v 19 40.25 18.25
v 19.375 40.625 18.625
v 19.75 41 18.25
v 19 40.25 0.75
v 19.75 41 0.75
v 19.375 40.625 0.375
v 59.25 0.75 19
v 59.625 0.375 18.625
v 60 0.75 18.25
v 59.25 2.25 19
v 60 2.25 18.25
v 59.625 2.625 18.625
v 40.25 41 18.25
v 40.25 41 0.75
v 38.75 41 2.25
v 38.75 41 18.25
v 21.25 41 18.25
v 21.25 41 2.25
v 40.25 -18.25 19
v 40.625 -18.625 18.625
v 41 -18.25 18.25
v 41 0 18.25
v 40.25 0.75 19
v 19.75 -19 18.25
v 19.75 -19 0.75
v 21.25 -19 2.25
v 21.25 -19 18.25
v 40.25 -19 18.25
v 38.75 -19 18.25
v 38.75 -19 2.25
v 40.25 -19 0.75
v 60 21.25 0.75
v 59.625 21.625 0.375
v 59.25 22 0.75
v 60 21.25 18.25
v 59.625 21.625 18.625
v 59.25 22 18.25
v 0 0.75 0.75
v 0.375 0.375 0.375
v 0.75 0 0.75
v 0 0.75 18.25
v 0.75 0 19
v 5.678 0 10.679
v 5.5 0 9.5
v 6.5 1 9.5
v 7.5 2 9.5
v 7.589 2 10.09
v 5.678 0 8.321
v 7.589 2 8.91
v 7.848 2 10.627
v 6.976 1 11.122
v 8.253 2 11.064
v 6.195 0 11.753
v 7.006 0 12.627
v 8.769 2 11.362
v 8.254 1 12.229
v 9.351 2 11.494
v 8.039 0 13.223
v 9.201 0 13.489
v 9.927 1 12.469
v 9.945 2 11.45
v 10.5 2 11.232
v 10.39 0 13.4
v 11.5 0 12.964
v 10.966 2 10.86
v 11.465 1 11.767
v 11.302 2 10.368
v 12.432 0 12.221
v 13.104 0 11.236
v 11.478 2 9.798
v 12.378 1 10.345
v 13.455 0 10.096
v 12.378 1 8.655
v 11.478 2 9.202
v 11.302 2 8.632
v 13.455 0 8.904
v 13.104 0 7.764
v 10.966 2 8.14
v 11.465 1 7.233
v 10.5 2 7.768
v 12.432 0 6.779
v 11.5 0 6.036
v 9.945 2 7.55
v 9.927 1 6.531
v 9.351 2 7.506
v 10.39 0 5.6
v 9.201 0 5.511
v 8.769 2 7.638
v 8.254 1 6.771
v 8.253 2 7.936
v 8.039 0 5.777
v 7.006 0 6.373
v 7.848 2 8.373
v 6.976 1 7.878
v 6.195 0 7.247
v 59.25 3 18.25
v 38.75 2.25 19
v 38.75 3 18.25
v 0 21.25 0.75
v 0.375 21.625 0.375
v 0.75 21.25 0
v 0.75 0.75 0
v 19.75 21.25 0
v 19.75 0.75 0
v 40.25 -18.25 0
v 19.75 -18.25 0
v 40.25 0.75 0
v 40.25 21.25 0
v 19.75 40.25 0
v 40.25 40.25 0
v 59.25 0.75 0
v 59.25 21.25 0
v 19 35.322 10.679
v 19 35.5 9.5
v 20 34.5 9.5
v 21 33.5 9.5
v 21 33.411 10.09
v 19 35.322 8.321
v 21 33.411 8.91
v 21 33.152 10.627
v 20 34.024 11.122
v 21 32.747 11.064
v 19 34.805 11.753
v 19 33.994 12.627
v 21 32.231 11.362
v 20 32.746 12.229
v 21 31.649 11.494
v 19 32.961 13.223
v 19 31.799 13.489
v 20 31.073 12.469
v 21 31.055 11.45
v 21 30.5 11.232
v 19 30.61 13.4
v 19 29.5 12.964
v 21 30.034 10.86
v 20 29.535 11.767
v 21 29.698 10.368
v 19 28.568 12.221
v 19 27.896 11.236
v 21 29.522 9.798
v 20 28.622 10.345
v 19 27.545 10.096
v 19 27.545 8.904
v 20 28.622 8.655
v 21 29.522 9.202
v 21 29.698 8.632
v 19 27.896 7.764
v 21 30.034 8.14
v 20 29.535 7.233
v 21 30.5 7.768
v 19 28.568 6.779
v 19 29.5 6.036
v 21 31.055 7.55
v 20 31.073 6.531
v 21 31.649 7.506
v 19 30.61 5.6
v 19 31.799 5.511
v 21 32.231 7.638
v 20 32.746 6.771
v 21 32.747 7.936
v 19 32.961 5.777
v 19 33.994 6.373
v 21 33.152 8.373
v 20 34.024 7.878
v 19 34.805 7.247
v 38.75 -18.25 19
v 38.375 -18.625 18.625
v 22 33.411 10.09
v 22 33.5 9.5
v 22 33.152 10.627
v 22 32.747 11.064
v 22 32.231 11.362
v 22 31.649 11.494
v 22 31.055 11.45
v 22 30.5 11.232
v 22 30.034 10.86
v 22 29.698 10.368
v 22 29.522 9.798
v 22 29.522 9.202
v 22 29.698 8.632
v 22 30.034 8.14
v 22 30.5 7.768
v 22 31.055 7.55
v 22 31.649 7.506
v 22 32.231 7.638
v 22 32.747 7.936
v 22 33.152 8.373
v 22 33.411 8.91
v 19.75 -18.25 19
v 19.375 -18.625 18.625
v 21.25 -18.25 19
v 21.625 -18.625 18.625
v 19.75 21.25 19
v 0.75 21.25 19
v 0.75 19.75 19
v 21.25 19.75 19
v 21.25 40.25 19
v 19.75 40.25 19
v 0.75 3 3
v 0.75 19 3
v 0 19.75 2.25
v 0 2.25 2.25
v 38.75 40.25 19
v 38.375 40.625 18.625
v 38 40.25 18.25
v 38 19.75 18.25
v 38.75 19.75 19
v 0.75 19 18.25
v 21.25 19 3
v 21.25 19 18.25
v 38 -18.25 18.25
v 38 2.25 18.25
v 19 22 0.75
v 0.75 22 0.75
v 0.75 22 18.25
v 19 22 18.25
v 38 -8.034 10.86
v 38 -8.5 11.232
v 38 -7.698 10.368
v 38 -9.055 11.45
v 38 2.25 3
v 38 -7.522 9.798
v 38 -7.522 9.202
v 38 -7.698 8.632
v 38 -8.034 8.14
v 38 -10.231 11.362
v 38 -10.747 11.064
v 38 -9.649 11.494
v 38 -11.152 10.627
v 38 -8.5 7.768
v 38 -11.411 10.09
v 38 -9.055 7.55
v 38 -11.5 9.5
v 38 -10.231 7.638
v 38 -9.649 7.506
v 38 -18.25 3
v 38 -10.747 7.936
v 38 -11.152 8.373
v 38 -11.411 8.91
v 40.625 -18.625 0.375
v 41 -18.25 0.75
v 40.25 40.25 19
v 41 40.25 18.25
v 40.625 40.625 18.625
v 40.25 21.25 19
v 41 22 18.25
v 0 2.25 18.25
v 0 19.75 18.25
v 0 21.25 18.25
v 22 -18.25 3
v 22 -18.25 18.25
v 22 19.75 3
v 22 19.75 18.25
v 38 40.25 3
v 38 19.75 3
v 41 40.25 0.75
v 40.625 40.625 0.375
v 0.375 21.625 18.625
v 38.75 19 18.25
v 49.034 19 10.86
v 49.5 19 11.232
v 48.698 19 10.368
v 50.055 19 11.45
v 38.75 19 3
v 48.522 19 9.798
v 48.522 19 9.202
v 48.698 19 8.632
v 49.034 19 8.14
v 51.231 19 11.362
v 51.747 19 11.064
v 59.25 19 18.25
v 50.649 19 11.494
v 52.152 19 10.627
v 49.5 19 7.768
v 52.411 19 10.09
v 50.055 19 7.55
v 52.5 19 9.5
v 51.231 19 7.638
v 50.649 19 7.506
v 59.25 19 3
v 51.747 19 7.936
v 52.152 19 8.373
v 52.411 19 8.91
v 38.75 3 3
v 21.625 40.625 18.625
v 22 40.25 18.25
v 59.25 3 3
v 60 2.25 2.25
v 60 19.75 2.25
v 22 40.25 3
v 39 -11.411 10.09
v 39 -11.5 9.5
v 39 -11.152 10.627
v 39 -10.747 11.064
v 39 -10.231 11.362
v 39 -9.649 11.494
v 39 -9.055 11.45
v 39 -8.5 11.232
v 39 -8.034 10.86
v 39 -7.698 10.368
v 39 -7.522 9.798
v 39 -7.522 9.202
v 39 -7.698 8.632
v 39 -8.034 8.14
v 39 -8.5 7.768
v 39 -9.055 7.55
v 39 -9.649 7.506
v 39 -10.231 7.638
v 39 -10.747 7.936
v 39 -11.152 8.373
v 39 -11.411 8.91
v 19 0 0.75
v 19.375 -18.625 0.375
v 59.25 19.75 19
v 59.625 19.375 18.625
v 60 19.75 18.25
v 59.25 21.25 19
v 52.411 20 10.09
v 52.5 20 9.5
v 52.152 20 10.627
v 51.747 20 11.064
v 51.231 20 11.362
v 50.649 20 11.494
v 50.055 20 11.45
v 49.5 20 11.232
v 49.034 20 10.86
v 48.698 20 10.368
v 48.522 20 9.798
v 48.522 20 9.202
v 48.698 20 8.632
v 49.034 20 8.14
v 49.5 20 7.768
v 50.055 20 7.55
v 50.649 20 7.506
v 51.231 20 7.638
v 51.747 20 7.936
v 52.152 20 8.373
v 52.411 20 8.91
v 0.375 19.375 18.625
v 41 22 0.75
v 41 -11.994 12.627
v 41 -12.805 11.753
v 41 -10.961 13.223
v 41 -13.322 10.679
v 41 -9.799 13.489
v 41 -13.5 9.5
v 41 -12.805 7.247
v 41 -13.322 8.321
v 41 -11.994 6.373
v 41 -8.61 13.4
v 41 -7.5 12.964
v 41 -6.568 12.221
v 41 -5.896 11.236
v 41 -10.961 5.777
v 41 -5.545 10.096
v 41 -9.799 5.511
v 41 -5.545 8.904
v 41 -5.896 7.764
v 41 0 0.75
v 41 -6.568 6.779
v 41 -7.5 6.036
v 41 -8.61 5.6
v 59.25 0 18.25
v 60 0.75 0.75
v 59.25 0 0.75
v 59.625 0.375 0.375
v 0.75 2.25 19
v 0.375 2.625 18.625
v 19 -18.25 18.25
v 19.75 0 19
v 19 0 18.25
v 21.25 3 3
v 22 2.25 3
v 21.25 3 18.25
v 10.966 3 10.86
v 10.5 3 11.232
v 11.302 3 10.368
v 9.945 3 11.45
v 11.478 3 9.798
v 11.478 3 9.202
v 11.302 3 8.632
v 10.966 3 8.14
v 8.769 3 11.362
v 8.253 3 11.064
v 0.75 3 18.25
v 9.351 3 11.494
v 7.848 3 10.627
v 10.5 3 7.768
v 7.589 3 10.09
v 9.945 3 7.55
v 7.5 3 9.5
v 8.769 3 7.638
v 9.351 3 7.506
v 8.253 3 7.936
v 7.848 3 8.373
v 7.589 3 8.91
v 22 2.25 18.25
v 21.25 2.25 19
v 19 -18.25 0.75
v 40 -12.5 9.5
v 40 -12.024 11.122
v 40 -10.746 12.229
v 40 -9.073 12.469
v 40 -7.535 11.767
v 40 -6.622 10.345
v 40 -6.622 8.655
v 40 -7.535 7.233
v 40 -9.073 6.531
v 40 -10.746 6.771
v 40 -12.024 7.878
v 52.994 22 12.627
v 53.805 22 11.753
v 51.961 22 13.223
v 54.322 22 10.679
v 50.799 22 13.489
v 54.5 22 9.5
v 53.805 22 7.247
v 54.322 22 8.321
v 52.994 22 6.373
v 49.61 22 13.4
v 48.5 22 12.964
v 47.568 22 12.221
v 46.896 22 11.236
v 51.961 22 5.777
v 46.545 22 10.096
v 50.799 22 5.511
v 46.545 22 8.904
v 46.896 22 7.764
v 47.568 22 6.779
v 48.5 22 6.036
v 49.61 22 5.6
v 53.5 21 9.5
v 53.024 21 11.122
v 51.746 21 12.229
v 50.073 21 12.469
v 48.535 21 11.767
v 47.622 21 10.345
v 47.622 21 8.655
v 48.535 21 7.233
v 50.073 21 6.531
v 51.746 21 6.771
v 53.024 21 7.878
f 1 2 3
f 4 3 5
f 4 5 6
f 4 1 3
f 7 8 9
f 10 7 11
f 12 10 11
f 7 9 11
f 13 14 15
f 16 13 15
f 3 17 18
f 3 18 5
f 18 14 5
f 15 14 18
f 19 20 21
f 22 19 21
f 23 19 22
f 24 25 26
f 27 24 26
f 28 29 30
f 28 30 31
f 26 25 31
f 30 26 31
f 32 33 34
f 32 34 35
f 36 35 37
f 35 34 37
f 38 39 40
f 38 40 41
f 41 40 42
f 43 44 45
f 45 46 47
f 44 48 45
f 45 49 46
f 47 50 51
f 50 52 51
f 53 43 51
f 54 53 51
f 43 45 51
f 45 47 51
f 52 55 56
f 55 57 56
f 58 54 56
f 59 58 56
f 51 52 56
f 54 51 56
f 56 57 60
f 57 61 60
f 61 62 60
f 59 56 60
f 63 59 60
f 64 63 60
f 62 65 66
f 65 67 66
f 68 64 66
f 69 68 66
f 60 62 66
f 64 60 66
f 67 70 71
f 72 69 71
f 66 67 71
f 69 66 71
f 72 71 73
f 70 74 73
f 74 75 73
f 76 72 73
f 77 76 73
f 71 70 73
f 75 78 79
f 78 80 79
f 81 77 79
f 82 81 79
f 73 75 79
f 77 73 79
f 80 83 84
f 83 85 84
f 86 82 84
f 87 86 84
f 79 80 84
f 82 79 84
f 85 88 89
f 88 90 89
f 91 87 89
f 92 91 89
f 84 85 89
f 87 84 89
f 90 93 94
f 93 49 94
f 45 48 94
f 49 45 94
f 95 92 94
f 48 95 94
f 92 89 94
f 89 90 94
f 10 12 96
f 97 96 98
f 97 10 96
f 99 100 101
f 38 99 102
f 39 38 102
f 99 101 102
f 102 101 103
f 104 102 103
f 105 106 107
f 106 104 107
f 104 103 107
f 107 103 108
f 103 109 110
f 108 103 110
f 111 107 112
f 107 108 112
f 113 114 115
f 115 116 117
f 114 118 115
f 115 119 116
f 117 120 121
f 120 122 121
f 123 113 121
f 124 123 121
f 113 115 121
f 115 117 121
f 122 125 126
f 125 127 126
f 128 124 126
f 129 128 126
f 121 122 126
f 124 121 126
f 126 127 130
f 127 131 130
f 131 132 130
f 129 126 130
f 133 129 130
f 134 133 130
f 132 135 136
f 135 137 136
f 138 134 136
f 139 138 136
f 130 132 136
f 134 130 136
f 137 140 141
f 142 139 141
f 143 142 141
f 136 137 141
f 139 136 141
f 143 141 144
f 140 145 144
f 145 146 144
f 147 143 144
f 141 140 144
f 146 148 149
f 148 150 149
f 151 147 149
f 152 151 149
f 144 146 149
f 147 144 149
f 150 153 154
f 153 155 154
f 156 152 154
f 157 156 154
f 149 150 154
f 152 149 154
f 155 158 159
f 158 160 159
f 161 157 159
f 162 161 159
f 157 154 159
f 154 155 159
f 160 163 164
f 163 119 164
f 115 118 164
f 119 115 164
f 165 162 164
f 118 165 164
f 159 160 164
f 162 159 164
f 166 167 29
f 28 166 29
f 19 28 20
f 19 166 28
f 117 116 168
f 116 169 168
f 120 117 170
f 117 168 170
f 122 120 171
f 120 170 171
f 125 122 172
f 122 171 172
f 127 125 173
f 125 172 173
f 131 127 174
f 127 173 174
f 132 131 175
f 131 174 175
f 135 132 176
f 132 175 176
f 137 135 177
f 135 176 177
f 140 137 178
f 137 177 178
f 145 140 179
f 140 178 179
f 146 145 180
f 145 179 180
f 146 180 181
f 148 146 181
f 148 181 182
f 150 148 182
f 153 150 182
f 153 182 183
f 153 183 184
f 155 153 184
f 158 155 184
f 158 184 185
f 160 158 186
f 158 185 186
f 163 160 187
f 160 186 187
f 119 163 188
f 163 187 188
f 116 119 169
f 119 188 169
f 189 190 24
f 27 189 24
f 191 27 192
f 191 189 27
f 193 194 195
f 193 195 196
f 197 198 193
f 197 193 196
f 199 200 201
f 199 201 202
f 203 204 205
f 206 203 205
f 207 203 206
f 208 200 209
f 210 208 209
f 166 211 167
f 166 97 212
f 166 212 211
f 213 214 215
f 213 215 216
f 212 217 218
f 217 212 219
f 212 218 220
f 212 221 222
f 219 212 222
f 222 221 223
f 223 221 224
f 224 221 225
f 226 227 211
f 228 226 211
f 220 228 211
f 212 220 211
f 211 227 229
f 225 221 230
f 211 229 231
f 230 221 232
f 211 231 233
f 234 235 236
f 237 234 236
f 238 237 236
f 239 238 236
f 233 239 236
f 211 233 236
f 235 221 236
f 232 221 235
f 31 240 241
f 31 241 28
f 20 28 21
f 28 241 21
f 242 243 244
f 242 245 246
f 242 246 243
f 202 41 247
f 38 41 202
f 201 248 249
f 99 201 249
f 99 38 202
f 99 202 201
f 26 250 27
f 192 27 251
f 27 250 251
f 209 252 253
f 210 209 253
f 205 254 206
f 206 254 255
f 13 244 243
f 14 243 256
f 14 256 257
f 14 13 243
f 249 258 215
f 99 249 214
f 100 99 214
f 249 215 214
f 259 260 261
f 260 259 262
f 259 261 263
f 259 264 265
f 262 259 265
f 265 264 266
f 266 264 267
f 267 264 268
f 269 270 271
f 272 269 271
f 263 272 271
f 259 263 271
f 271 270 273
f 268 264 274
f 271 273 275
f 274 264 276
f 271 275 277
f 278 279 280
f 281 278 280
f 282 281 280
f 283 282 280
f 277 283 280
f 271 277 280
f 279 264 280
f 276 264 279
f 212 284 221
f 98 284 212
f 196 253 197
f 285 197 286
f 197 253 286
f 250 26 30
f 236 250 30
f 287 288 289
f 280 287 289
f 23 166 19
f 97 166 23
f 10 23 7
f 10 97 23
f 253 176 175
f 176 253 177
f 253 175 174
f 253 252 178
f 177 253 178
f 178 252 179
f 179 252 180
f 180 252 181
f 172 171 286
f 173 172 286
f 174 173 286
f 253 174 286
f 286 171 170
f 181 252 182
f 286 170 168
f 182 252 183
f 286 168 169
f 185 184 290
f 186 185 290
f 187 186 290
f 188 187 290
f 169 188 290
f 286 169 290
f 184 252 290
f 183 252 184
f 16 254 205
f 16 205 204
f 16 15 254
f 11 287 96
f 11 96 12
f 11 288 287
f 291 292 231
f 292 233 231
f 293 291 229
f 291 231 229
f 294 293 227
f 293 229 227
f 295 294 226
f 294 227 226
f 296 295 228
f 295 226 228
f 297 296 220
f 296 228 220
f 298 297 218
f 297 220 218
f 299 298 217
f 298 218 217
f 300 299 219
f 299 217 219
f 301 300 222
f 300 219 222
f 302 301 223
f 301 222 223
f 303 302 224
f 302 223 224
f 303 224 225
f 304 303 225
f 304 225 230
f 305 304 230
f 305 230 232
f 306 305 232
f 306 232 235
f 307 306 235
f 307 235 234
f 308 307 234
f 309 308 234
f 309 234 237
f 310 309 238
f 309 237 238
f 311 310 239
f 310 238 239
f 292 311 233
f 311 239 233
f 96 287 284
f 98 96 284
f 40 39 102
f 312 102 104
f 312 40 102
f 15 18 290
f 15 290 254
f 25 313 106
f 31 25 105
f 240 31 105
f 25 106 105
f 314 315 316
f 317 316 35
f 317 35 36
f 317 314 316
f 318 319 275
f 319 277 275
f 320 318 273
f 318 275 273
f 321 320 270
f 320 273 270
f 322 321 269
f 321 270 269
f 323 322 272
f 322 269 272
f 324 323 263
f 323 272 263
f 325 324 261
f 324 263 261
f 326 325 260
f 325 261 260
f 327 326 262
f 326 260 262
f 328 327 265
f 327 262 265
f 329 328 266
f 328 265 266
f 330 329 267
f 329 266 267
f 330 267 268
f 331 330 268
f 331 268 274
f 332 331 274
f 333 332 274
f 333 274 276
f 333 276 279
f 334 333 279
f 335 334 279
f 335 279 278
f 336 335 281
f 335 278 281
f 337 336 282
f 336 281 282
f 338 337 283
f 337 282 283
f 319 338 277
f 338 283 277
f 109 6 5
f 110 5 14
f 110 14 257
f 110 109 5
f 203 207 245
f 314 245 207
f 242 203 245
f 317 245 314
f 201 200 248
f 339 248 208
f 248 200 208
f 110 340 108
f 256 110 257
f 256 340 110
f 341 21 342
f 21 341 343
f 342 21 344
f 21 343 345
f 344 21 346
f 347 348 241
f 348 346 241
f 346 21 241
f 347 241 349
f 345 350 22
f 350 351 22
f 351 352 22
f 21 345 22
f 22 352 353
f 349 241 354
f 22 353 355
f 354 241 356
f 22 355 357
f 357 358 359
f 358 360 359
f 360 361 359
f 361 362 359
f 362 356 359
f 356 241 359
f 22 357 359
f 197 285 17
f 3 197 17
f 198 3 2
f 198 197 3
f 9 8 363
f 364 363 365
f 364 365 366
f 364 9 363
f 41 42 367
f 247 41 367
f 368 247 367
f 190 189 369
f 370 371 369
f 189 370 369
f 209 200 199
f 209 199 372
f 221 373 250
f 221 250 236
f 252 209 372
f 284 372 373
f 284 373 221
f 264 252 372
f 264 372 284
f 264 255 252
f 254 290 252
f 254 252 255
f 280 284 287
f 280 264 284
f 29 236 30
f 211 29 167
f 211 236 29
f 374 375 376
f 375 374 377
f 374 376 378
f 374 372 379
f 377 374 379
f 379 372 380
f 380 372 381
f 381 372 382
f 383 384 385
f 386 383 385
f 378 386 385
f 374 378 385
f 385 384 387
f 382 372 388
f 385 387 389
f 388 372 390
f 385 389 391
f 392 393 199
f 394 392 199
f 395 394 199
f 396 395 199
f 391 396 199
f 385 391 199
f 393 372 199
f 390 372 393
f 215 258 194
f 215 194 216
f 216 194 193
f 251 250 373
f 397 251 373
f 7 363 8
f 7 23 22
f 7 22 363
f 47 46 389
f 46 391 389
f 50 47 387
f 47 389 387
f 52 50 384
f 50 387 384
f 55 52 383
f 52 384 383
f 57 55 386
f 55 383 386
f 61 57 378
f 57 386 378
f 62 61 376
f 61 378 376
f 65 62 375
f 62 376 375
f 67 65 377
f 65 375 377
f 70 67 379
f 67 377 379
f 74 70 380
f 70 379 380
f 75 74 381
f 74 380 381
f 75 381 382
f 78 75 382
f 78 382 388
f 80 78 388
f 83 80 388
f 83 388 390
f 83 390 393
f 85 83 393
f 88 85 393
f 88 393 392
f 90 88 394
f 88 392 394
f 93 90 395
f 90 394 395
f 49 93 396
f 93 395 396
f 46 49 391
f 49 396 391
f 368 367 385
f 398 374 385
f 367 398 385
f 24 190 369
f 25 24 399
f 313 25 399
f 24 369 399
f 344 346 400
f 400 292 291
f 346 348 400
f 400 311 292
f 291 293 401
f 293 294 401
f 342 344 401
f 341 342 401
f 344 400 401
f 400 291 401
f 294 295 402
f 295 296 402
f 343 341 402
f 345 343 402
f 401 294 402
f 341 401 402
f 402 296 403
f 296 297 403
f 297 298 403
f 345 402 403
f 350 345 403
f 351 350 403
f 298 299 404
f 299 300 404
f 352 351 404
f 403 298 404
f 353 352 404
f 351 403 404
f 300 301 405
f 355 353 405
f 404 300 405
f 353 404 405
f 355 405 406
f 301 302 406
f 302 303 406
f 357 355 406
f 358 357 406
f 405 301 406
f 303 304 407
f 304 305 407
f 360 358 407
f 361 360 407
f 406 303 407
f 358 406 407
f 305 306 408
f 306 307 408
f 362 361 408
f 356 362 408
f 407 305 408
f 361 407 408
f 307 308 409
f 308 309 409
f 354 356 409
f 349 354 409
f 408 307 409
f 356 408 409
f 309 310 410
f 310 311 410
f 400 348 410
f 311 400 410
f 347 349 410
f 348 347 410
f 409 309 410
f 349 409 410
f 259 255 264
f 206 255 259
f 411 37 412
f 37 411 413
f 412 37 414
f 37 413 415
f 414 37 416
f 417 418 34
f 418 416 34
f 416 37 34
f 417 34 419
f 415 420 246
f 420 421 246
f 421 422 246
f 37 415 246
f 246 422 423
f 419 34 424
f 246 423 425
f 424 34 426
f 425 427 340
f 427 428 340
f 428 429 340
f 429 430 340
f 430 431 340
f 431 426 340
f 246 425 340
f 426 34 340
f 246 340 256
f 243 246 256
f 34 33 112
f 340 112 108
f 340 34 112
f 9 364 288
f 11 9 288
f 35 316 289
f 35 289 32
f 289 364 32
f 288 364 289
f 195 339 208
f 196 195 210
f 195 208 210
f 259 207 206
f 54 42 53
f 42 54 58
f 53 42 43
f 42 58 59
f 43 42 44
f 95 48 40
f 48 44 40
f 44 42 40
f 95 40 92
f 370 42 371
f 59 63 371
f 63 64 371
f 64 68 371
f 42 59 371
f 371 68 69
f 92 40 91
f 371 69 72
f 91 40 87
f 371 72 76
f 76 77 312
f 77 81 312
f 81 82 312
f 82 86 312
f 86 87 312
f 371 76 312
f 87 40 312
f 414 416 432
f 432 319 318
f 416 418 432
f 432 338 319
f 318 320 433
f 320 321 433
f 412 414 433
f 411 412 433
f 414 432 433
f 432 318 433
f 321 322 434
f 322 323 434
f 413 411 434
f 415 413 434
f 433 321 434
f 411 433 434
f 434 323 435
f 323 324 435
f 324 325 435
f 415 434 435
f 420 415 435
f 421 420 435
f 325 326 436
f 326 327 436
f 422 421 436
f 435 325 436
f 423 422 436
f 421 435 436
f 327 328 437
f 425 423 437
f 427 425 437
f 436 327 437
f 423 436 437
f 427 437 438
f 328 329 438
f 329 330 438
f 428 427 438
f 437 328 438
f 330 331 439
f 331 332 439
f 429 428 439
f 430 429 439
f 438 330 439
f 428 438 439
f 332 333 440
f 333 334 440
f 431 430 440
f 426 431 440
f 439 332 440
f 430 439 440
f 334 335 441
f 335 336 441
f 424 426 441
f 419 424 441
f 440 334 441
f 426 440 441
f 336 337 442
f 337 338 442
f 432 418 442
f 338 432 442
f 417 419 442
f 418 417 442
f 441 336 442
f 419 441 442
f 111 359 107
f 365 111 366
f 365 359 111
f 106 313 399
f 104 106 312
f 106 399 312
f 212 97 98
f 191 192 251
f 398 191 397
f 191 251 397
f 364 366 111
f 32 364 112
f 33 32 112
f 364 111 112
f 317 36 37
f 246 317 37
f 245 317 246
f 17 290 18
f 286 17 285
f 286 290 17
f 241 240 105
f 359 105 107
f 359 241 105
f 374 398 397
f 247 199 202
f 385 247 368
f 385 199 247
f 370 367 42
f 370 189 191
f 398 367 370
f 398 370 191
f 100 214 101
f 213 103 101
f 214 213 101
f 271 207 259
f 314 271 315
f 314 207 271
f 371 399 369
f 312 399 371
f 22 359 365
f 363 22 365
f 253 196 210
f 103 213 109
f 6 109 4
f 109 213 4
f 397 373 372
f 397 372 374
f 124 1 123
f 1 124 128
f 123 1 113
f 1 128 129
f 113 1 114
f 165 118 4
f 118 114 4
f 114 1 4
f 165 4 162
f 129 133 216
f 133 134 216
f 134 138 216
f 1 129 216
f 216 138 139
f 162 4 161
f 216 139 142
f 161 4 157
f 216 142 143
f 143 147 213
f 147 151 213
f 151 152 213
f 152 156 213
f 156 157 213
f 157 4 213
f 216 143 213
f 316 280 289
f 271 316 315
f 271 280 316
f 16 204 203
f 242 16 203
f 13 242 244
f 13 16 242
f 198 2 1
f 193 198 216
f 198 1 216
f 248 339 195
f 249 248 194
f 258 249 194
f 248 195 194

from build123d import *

# Parameters (mm, degrees)
F0_W            = 22
F0_H            = 19
F1_DEPTH        = 3
F2_W            = 19
F2_H            = 3
F2_W_2          = 3
F2_H_2          = 19
F3_DEPTH        = 16
F5_D            = 4
F5_DEPTH        = 12
F5_CSINK_D      = 8
F5_CSINK_ANGLE  = 90
F5_TIP          = 1.2017212381
F7_D            = 4
F7_DEPTH        = 12
F7_CSINK_D      = 8
F7_CSINK_ANGLE  = 90
F7_TIP          = 1.2017212381
F9_D            = 4
F9_DEPTH        = 12
F9_CSINK_D      = 8
F9_CSINK_ANGLE  = 90
F9_TIP          = 1.2017212381
F11_D           = 4
F11_DEPTH       = 12
F11_CSINK_D     = 8
F11_CSINK_ANGLE = 90
F11_TIP         = 1.2017212381
F12_SIZE        = 0.75
F13_SIZE        = 0.75
F14_SIZE        = 0.75


with BuildPart() as f1:
    # F0 (on Top) → F1 (new body)
    with BuildSketch(Plane.XY):
        with Locations((30, -9.5)):
            Rectangle(F0_W, F0_H)
        with Locations((30, 31.5)):
            Rectangle(F0_W, F0_H)
        Polygon((0, 22), (0, 0), (19, 0), (41, 0), (60, 0), (60, 22), (41, 22), (19, 22), align=None)
    extrude(amount=F1_DEPTH)

    # F2 (on face) → F3 (join)
    with BuildSketch(Plane.XY.offset(3)):
        with Locations((9.5, 20.5)):
            Rectangle(F2_W, F2_H)
        Polygon((19, 41), (19, 22), (19, 19), (22, 19), (22, 41), align=None)
        with Locations((9.5, 1.5)):
            Rectangle(F2_W, F2_H)
        Polygon((19, 3), (19, 0), (19, -19), (22, -19), (22, 3), align=None)
        Polygon((60, 22), (41, 22), (38, 22), (38, 19), (60, 19), align=None)
        with Locations((39.5, 31.5)):
            Rectangle(F2_W_2, F2_H_2)
        with Locations((39.5, -9.5)):
            Rectangle(F2_W_2, F2_H_2)
        Polygon((38, 0), (41, 0), (60, 0), (60, 3), (38, 3), align=None)
    extrude(amount=F3_DEPTH)

    # F5
    with Locations(Plane.XZ):
        with Locations((9.5, 9.5)):
            CounterSinkHole(F5_D / 2, F5_CSINK_D / 2, depth=F5_DEPTH, counter_sink_angle=F5_CSINK_ANGLE)
            with Locations((0, 0, -(F5_DEPTH + F5_TIP / 2))):  # 118° drill point
                Cone(0, F5_D / 2, F5_TIP, mode=Mode.SUBTRACT)

    # F7
    with Locations(Plane.YZ.offset(41)):
        with Locations((-9.5, 9.5)):
            CounterSinkHole(F7_D / 2, F7_CSINK_D / 2, depth=F7_DEPTH, counter_sink_angle=F7_CSINK_ANGLE)
            with Locations((0, 0, -(F7_DEPTH + F7_TIP / 2))):  # 118° drill point
                Cone(0, F7_D / 2, F7_TIP, mode=Mode.SUBTRACT)

    # F9
    with Locations(Plane(origin=(0, 22, 0), x_dir=(-1, 0, 0), z_dir=(0, 1, 0))):
        with Locations((-50.5, 9.5)):
            CounterSinkHole(F9_D / 2, F9_CSINK_D / 2, depth=F9_DEPTH, counter_sink_angle=F9_CSINK_ANGLE)
            with Locations((0, 0, -(F9_DEPTH + F9_TIP / 2))):  # 118° drill point
                Cone(0, F9_D / 2, F9_TIP, mode=Mode.SUBTRACT)

    # F11
    with Locations(Plane(origin=(19, 0, 0), x_dir=(0, -1, 0), z_dir=(-1, 0, 0))):
        with Locations((-31.5, 9.5)):
            CounterSinkHole(F11_D / 2, F11_CSINK_D / 2, depth=F11_DEPTH, counter_sink_angle=F11_CSINK_ANGLE)
            with Locations((0, 0, -(F11_DEPTH + F11_TIP / 2))):  # 118° drill point
                Cone(0, F11_D / 2, F11_TIP, mode=Mode.SUBTRACT)

    # F12
    f12_edges = [f1.edges().sort_by_distance(p)[0] for p in [
        (19, -19, 9.5),
        (20.5, -19, 19),
        (22, -19, 11),
        (30, -19, 3),
        (38, -19, 11),
        (39.5, -19, 19),
        (41, -19, 9.5),
        (30, -19, 0),
        (60, 0, 9.5),
        (60, 1.5, 19),
        (60, 3, 11),
        (60, 11, 3),
        (60, 19, 11),
        (60, 20.5, 19),
        (60, 22, 9.5),
        (60, 11, 0),
        (41, 41, 9.5),
        (39.5, 41, 19),
        (38, 41, 11),
        (30, 41, 3),
        (22, 41, 11),
        (20.5, 41, 19),
        (19, 41, 9.5),
        (30, 41, 0),
        (0, 22, 9.5),
        (0, 20.5, 19),
        (0, 19, 11),
        (0, 11, 3),
        (0, 3, 11),
        (0, 1.5, 19),
        (0, 0, 9.5),
        (0, 11, 0),
    ]]
    chamfer(f12_edges, length=F12_SIZE)

    # F13
    f13_edges = [f1.edges().sort_by_distance(p)[0] for p in [
        (9.875, 22, 0),
        (19, 31.125, 0),
        (41, 31.125, 0),
        (50.125, 22, 0),
        (50.125, 0, 0),
        (41, -9.125, 0),
        (19, -9.125, 0),
        (9.875, 0, 0),
    ]]
    chamfer(f13_edges, length=F13_SIZE)

    # F14
    f14_edges = [f1.edges().sort_by_distance(p)[0] for p in [
        (50.125, 0, 19),
        (41, -9.125, 19),
        (38, -7.625, 19),
        (48.625, 3, 19),
        (38, 3, 11),
        (22, -7.625, 19),
        (19, -9.125, 19),
        (11.375, 3, 19),
        (22, 3, 11),
        (11.375, 19, 19),
        (9.875, 22, 19),
        (19, 31.125, 19),
        (22, 29.625, 19),
        (22, 19, 11),
        (48.625, 19, 19),
        (50.125, 22, 19),
        (41, 31.125, 19),
        (38, 29.625, 19),
        (38, 19, 11),
    ]]
    chamfer(f14_edges, length=F14_SIZE)


solid = f1.part
